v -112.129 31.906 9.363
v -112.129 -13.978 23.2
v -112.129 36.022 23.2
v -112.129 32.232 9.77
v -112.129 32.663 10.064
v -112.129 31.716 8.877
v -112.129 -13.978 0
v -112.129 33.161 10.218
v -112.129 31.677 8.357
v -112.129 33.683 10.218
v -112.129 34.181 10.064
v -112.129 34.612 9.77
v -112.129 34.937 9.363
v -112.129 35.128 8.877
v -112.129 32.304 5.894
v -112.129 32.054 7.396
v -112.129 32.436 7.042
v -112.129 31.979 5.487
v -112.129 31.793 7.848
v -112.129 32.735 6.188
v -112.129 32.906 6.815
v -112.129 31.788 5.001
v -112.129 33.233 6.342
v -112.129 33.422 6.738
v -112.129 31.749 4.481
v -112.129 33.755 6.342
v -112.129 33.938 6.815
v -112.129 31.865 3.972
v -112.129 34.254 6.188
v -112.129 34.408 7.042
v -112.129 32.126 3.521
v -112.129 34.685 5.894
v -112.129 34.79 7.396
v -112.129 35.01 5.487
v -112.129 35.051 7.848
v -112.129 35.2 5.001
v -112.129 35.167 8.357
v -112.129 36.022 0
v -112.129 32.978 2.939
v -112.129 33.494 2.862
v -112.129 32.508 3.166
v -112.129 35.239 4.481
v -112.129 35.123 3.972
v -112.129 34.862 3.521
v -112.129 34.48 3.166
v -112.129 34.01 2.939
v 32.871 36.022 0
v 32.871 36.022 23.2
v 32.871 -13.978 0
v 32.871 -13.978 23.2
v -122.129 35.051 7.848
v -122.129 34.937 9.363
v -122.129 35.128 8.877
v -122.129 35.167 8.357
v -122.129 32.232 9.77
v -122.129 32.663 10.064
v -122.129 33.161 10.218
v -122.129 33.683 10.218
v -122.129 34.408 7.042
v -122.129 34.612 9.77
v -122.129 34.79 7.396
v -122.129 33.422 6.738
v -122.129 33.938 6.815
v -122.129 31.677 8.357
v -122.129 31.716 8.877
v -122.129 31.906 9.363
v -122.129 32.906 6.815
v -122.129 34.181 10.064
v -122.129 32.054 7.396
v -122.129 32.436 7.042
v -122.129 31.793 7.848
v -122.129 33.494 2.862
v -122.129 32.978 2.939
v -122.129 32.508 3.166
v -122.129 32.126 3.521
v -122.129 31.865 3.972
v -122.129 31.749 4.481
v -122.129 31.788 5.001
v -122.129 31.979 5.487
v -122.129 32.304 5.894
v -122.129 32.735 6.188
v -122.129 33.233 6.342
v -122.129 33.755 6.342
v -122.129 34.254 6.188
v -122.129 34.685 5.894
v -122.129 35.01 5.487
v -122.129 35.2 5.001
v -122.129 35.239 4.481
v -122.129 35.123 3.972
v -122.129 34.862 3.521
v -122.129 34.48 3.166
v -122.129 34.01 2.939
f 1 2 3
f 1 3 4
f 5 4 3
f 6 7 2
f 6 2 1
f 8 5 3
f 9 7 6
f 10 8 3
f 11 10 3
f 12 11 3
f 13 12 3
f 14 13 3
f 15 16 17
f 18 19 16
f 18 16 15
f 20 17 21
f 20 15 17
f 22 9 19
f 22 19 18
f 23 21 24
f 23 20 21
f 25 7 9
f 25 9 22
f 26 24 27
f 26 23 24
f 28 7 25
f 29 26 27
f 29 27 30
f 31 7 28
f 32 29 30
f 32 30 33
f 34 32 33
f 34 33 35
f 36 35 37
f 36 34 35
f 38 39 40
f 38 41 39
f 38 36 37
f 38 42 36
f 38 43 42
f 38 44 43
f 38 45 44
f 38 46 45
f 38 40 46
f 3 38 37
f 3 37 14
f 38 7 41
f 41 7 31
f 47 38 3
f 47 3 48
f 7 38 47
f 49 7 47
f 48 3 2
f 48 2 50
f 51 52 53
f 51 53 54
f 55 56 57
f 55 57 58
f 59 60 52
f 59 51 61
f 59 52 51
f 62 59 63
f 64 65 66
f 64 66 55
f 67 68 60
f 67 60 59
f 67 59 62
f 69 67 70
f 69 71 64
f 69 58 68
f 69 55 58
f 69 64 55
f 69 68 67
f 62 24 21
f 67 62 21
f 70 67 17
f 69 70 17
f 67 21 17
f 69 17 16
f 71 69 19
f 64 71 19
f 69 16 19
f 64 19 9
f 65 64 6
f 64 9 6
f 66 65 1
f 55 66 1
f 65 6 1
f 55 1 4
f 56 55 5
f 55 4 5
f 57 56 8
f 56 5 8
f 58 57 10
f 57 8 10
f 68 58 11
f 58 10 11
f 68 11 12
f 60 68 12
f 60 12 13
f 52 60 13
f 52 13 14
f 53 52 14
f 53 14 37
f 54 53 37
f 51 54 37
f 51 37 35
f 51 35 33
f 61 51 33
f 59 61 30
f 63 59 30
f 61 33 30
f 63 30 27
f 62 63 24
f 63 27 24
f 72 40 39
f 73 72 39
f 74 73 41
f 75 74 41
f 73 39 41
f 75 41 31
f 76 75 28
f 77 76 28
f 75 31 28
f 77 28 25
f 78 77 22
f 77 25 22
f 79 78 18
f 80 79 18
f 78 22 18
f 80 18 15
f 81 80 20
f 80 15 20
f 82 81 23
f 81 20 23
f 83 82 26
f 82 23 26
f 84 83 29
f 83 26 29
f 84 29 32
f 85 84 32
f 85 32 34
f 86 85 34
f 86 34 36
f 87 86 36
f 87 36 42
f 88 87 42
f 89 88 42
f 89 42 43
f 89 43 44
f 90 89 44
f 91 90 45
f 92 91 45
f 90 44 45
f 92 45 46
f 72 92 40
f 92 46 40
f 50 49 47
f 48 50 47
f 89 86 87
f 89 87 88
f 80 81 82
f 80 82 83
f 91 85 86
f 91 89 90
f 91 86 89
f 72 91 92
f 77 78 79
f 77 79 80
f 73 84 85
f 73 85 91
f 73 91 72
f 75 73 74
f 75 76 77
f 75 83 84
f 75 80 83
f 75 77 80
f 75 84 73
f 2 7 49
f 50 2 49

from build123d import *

# Parameters (mm, degrees)
SKETCH1_W           = 145
SKETCH1_H           = 50
BOSS_EXTRUDE1_DEPTH = 23.2
SKETCH2_R           = 1.75
BOSS_EXTRUDE2_DEPTH = 10
SKETCH3_R           = 1.75
BOSS_EXTRUDE3_DEPTH = 10


with BuildPart() as part:
    # Sketch1 → Boss-Extrude1 (new body)
    with BuildSketch(Plane.XY):
        with Locations((-39.629237288, 11.022245763)):
            Rectangle(SKETCH1_W, SKETCH1_H)
    extrude(amount=BOSS_EXTRUDE1_DEPTH)

    # Sketch2 → Boss-Extrude2 (add)
    with BuildSketch(Plane.ZY.offset(112.129237288)):
        with Locations(Location((4.611645571, 33.494222045, 0), (0, 0, 180))):
            Circle(SKETCH2_R)
    extrude(amount=BOSS_EXTRUDE2_DEPTH)

    # Sketch3 → Boss-Extrude3 (add)
    with BuildSketch(Plane.ZY.offset(112.129237288)):
        with Locations(Location((8.487504138, 33.421885549, 0), (0, 0, 180))):
            Circle(SKETCH3_R)
    extrude(amount=BOSS_EXTRUDE3_DEPTH)


solid = part.part
